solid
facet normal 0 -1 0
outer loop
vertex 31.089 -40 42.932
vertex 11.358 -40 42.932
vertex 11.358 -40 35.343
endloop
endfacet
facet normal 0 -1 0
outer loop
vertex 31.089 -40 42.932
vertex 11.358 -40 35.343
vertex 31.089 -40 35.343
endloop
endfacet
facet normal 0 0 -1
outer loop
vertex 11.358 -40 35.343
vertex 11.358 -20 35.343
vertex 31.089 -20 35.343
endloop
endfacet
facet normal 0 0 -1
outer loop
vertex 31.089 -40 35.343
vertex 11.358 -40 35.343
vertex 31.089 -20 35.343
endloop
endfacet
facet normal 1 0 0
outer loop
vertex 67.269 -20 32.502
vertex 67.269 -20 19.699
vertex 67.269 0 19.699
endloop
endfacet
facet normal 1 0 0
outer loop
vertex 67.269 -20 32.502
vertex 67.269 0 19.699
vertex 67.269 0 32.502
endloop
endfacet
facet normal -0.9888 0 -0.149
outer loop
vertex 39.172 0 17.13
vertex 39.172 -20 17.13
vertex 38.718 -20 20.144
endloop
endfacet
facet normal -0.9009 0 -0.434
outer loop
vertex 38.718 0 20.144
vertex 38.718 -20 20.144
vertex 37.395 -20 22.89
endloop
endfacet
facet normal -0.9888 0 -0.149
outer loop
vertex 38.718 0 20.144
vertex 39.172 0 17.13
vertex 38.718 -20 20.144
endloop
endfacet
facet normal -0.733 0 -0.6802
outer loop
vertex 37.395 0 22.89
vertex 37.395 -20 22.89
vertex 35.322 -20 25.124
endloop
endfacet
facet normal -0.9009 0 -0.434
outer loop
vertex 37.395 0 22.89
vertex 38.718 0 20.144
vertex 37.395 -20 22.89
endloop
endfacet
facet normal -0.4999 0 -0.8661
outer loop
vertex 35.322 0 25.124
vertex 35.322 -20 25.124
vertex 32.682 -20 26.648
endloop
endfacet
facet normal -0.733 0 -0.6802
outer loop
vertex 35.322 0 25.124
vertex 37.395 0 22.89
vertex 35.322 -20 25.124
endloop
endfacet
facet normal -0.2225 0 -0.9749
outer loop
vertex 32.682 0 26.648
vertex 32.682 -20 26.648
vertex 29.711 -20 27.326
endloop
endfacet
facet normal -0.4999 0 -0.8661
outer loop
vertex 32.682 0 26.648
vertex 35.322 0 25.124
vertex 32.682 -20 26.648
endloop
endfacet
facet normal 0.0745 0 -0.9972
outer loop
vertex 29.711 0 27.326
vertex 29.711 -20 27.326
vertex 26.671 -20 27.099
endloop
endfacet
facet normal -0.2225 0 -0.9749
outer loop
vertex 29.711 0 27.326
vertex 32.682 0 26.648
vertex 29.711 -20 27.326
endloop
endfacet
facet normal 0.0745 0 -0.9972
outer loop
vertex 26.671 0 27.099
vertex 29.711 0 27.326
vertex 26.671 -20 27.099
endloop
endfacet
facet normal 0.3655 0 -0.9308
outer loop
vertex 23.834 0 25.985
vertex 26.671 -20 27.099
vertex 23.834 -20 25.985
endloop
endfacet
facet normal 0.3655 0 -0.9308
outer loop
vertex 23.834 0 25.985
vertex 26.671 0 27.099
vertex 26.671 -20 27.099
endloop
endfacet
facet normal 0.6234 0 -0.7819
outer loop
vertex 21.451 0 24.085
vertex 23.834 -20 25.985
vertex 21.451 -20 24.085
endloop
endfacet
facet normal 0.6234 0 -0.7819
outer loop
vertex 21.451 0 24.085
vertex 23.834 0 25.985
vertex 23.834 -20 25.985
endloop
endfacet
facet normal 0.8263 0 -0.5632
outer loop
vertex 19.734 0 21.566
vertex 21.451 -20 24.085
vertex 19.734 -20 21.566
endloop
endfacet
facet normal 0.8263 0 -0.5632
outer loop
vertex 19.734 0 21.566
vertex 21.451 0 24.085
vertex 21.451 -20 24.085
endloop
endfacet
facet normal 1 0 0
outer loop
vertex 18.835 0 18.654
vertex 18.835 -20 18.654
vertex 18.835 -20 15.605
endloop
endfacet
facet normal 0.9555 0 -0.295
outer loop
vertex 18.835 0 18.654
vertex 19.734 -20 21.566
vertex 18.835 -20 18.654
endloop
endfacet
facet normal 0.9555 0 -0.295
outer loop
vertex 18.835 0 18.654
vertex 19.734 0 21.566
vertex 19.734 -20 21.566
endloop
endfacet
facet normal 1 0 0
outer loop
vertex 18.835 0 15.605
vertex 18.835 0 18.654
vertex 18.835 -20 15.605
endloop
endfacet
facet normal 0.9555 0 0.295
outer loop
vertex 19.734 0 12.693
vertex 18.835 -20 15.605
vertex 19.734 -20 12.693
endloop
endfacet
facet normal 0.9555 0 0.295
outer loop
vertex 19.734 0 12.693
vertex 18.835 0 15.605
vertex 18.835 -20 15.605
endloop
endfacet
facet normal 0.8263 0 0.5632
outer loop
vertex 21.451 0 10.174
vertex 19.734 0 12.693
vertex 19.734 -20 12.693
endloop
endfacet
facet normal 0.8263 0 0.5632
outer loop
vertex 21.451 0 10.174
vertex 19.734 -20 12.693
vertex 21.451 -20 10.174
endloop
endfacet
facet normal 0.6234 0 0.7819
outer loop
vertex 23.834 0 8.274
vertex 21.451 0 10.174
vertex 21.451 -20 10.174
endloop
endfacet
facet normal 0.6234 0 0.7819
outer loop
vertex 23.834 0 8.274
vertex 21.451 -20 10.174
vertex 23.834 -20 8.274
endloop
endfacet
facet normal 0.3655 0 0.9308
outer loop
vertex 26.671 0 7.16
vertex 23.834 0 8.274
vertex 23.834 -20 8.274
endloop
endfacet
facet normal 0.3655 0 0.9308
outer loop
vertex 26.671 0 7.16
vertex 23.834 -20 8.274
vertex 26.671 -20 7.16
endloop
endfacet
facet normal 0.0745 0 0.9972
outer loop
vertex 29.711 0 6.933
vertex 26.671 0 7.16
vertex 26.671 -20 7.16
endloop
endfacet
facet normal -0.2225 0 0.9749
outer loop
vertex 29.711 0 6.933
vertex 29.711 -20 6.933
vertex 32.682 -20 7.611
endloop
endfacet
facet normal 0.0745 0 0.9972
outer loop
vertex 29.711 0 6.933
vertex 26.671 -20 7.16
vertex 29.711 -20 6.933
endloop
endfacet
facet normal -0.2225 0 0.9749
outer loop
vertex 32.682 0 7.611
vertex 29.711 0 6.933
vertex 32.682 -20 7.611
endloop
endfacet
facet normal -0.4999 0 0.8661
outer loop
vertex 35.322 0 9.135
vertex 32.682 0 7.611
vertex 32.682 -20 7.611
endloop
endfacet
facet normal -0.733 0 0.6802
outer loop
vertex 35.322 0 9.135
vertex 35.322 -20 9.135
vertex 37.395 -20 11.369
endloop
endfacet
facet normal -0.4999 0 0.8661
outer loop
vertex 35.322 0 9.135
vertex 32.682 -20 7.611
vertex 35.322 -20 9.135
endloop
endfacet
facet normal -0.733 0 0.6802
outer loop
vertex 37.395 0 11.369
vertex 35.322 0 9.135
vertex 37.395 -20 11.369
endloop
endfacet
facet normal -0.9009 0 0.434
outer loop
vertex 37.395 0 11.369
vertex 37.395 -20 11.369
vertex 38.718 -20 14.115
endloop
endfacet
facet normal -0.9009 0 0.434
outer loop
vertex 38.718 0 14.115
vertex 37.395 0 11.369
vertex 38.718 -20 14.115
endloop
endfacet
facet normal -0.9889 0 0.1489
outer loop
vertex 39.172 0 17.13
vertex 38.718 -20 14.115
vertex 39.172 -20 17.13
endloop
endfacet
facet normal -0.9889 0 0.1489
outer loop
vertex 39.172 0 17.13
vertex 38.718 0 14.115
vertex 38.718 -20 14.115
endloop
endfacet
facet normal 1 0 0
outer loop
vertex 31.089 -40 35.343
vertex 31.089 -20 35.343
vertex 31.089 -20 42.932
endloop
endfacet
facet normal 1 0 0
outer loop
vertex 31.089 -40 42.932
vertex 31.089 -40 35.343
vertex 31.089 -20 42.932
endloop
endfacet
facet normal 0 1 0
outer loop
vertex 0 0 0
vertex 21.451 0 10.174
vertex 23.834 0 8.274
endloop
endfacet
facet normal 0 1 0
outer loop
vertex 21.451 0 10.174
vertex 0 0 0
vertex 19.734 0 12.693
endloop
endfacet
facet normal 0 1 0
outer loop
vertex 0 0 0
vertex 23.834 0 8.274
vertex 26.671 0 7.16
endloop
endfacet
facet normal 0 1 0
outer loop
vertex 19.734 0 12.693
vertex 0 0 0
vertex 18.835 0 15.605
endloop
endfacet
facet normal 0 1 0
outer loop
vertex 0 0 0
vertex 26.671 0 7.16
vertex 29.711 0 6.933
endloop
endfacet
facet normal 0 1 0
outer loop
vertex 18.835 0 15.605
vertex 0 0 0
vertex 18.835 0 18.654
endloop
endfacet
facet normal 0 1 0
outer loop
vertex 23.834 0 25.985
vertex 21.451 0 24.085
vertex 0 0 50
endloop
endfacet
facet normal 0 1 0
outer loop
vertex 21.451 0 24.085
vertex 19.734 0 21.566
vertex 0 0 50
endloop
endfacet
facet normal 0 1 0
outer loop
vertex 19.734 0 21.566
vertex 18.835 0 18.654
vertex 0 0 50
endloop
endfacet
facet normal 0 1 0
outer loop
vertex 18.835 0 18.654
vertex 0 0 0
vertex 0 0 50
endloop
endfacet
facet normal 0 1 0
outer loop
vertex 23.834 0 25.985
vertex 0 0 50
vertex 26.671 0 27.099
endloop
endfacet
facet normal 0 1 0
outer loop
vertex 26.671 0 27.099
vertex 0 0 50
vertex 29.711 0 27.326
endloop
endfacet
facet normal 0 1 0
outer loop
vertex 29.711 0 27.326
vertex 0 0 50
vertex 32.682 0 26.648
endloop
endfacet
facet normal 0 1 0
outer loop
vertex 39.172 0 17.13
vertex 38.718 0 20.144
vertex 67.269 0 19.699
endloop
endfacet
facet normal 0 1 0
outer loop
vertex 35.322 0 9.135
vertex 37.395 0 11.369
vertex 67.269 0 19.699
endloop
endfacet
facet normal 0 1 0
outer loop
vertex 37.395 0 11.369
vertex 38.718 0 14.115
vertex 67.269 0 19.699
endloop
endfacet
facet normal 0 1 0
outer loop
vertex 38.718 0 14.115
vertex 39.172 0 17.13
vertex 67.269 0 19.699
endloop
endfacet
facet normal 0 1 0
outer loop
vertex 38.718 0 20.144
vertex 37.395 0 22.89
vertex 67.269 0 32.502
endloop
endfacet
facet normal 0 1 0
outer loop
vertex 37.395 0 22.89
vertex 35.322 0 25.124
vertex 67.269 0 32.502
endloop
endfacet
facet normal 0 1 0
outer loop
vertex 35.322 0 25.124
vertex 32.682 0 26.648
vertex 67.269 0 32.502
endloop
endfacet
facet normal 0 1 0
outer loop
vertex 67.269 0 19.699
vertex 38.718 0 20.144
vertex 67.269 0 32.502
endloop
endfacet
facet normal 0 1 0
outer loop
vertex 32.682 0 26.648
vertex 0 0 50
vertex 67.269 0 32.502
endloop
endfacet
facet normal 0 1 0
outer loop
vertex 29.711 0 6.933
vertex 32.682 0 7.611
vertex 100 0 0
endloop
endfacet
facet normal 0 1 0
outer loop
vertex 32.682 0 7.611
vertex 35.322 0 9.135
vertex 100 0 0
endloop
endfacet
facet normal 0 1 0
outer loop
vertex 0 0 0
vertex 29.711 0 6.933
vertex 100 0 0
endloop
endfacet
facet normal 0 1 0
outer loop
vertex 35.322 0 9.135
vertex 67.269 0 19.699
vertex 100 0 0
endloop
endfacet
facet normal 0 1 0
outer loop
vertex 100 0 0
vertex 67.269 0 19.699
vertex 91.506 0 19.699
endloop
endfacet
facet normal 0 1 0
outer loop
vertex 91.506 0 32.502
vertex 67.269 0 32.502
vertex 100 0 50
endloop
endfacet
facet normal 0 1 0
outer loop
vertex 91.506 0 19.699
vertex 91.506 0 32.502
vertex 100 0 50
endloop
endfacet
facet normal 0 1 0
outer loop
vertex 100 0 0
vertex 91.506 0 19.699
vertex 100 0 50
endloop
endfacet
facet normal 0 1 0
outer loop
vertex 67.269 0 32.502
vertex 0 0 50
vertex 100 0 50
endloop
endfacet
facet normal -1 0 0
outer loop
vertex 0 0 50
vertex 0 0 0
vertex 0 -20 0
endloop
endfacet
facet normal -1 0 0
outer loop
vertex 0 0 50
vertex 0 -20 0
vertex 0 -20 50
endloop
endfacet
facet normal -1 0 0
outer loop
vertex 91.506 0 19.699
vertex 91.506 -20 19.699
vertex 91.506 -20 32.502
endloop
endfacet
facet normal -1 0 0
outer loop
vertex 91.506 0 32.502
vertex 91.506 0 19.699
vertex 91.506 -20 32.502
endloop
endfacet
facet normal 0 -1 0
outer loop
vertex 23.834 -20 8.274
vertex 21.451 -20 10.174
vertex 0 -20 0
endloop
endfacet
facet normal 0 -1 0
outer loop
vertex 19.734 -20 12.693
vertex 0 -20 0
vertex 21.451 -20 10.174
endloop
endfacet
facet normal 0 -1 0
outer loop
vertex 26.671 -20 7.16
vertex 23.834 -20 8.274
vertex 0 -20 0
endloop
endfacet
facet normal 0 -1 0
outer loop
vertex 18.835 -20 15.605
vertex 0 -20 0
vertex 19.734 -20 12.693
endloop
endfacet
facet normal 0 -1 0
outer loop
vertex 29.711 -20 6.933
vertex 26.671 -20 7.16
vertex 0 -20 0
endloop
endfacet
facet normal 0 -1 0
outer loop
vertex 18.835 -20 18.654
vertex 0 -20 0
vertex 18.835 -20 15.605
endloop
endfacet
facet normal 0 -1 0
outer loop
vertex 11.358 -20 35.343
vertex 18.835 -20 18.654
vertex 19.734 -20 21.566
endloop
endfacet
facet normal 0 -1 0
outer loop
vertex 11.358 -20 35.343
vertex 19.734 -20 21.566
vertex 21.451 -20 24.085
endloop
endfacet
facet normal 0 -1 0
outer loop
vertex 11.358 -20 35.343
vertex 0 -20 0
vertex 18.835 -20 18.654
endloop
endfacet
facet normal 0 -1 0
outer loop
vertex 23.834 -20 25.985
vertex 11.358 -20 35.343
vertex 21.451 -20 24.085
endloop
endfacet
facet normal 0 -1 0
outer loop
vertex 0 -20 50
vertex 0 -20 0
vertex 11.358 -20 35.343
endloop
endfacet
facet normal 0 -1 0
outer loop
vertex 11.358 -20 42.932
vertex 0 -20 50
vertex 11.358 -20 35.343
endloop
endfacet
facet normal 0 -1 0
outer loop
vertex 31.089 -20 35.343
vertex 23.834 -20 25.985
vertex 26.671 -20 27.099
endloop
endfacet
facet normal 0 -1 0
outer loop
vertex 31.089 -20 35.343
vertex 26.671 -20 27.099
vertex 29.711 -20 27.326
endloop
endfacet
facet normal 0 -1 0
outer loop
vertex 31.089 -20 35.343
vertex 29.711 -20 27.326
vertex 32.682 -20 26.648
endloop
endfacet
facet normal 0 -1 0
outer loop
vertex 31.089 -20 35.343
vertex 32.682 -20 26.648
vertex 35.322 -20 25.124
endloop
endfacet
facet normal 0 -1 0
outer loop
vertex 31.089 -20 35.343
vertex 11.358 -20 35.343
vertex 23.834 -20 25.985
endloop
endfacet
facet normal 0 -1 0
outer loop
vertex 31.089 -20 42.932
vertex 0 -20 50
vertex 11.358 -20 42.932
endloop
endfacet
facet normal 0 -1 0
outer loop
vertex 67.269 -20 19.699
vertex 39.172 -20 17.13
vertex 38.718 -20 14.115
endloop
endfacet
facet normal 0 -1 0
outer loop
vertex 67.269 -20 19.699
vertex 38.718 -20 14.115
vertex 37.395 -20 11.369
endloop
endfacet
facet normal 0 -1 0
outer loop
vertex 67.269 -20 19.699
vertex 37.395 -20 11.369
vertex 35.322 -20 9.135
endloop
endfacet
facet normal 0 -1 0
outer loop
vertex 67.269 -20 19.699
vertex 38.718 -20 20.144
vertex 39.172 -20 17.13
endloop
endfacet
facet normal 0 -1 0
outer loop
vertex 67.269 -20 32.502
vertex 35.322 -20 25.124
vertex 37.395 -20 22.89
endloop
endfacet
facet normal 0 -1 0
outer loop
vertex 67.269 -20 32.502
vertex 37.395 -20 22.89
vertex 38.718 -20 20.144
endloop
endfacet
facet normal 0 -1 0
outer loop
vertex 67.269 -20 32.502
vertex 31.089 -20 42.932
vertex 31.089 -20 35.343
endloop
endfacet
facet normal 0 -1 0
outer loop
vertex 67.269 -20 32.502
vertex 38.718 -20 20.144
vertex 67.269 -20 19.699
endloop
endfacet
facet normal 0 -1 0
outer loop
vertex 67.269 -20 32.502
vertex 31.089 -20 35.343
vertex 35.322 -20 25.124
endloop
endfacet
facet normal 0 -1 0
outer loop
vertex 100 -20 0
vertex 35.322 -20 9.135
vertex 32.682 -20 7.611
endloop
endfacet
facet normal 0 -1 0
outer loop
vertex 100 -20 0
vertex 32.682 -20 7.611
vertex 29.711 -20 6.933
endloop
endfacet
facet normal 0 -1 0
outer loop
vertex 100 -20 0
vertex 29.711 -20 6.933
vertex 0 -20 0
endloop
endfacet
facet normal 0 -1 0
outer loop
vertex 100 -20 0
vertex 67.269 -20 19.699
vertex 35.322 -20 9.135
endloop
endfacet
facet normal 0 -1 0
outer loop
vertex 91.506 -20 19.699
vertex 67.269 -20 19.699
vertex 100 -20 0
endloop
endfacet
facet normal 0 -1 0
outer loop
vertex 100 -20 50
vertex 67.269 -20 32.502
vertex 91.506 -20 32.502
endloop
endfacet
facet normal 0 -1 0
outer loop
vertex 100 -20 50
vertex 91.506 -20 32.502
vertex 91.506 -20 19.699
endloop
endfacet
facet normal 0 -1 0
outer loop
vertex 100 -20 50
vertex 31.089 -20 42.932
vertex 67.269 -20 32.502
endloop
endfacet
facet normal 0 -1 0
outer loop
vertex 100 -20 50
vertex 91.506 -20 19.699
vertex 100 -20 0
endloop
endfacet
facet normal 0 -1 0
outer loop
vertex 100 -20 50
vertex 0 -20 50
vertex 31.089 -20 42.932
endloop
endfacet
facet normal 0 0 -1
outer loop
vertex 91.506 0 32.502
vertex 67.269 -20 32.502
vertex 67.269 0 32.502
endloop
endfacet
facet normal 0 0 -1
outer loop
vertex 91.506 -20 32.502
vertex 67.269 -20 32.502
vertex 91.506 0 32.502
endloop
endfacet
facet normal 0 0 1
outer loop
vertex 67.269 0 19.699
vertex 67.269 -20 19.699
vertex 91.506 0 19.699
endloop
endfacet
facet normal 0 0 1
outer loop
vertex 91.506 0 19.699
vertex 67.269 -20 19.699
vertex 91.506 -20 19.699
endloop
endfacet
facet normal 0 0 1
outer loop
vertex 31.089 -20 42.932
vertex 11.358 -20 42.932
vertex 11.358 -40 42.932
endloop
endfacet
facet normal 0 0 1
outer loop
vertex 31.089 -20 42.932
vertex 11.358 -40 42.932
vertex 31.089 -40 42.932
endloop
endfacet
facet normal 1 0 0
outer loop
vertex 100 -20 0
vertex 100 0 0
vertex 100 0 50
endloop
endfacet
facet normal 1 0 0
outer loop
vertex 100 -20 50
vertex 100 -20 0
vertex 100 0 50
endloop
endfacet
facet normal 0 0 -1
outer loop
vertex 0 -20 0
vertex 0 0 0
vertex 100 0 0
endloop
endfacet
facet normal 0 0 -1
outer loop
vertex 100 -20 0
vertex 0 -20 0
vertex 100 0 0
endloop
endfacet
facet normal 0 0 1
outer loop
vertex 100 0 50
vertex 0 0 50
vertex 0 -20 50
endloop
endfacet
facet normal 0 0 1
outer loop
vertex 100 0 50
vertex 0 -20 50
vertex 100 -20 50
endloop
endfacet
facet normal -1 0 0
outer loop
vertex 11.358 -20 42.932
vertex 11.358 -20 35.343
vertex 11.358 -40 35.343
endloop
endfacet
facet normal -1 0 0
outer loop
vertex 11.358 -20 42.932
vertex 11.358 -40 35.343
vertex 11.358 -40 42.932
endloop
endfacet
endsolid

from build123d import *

# Parameters (mm, degrees)
F0_W     = 100
F0_H     = 50
F1_DEPTH = 20
F2_R     = 10.225485
F3_DEPTH = 20.001
F4_W     = 24.237767
F4_H     = 12.803474
F5_DEPTH = 20.001
F6_W     = 19.731463
F6_H     = 7.589027
F7_DEPTH = 20


with BuildPart() as f1:
    # F0 (on Front) → F1 (new body)
    with BuildSketch(Plane.XZ):
        with Locations((50, 25)):
            Rectangle(F0_W, F0_H)
    extrude(amount=F1_DEPTH)

    # F2 (on Front) → F3 (cut, through all)
    with BuildSketch(Plane.XZ):
        with Locations((28.946707, 17.129513)):
            Circle(F2_R)
    extrude(amount=F3_DEPTH, mode=Mode.SUBTRACT)

    # F4 (on face) → F5 (cut, through all)
    with BuildSketch(Plane.XZ.offset(20)):
        with Locations((79.387456, 26.100426)):
            Rectangle(F4_W, F4_H)
    extrude(amount=-F5_DEPTH, mode=Mode.SUBTRACT)

    # F6 (on face) → F7 (join)
    with BuildSketch(Plane.XZ.offset(20)):
        with Locations((21.223658, 39.137683)):
            Rectangle(F6_W, F6_H)
    extrude(amount=F7_DEPTH)


solid = f1.part
